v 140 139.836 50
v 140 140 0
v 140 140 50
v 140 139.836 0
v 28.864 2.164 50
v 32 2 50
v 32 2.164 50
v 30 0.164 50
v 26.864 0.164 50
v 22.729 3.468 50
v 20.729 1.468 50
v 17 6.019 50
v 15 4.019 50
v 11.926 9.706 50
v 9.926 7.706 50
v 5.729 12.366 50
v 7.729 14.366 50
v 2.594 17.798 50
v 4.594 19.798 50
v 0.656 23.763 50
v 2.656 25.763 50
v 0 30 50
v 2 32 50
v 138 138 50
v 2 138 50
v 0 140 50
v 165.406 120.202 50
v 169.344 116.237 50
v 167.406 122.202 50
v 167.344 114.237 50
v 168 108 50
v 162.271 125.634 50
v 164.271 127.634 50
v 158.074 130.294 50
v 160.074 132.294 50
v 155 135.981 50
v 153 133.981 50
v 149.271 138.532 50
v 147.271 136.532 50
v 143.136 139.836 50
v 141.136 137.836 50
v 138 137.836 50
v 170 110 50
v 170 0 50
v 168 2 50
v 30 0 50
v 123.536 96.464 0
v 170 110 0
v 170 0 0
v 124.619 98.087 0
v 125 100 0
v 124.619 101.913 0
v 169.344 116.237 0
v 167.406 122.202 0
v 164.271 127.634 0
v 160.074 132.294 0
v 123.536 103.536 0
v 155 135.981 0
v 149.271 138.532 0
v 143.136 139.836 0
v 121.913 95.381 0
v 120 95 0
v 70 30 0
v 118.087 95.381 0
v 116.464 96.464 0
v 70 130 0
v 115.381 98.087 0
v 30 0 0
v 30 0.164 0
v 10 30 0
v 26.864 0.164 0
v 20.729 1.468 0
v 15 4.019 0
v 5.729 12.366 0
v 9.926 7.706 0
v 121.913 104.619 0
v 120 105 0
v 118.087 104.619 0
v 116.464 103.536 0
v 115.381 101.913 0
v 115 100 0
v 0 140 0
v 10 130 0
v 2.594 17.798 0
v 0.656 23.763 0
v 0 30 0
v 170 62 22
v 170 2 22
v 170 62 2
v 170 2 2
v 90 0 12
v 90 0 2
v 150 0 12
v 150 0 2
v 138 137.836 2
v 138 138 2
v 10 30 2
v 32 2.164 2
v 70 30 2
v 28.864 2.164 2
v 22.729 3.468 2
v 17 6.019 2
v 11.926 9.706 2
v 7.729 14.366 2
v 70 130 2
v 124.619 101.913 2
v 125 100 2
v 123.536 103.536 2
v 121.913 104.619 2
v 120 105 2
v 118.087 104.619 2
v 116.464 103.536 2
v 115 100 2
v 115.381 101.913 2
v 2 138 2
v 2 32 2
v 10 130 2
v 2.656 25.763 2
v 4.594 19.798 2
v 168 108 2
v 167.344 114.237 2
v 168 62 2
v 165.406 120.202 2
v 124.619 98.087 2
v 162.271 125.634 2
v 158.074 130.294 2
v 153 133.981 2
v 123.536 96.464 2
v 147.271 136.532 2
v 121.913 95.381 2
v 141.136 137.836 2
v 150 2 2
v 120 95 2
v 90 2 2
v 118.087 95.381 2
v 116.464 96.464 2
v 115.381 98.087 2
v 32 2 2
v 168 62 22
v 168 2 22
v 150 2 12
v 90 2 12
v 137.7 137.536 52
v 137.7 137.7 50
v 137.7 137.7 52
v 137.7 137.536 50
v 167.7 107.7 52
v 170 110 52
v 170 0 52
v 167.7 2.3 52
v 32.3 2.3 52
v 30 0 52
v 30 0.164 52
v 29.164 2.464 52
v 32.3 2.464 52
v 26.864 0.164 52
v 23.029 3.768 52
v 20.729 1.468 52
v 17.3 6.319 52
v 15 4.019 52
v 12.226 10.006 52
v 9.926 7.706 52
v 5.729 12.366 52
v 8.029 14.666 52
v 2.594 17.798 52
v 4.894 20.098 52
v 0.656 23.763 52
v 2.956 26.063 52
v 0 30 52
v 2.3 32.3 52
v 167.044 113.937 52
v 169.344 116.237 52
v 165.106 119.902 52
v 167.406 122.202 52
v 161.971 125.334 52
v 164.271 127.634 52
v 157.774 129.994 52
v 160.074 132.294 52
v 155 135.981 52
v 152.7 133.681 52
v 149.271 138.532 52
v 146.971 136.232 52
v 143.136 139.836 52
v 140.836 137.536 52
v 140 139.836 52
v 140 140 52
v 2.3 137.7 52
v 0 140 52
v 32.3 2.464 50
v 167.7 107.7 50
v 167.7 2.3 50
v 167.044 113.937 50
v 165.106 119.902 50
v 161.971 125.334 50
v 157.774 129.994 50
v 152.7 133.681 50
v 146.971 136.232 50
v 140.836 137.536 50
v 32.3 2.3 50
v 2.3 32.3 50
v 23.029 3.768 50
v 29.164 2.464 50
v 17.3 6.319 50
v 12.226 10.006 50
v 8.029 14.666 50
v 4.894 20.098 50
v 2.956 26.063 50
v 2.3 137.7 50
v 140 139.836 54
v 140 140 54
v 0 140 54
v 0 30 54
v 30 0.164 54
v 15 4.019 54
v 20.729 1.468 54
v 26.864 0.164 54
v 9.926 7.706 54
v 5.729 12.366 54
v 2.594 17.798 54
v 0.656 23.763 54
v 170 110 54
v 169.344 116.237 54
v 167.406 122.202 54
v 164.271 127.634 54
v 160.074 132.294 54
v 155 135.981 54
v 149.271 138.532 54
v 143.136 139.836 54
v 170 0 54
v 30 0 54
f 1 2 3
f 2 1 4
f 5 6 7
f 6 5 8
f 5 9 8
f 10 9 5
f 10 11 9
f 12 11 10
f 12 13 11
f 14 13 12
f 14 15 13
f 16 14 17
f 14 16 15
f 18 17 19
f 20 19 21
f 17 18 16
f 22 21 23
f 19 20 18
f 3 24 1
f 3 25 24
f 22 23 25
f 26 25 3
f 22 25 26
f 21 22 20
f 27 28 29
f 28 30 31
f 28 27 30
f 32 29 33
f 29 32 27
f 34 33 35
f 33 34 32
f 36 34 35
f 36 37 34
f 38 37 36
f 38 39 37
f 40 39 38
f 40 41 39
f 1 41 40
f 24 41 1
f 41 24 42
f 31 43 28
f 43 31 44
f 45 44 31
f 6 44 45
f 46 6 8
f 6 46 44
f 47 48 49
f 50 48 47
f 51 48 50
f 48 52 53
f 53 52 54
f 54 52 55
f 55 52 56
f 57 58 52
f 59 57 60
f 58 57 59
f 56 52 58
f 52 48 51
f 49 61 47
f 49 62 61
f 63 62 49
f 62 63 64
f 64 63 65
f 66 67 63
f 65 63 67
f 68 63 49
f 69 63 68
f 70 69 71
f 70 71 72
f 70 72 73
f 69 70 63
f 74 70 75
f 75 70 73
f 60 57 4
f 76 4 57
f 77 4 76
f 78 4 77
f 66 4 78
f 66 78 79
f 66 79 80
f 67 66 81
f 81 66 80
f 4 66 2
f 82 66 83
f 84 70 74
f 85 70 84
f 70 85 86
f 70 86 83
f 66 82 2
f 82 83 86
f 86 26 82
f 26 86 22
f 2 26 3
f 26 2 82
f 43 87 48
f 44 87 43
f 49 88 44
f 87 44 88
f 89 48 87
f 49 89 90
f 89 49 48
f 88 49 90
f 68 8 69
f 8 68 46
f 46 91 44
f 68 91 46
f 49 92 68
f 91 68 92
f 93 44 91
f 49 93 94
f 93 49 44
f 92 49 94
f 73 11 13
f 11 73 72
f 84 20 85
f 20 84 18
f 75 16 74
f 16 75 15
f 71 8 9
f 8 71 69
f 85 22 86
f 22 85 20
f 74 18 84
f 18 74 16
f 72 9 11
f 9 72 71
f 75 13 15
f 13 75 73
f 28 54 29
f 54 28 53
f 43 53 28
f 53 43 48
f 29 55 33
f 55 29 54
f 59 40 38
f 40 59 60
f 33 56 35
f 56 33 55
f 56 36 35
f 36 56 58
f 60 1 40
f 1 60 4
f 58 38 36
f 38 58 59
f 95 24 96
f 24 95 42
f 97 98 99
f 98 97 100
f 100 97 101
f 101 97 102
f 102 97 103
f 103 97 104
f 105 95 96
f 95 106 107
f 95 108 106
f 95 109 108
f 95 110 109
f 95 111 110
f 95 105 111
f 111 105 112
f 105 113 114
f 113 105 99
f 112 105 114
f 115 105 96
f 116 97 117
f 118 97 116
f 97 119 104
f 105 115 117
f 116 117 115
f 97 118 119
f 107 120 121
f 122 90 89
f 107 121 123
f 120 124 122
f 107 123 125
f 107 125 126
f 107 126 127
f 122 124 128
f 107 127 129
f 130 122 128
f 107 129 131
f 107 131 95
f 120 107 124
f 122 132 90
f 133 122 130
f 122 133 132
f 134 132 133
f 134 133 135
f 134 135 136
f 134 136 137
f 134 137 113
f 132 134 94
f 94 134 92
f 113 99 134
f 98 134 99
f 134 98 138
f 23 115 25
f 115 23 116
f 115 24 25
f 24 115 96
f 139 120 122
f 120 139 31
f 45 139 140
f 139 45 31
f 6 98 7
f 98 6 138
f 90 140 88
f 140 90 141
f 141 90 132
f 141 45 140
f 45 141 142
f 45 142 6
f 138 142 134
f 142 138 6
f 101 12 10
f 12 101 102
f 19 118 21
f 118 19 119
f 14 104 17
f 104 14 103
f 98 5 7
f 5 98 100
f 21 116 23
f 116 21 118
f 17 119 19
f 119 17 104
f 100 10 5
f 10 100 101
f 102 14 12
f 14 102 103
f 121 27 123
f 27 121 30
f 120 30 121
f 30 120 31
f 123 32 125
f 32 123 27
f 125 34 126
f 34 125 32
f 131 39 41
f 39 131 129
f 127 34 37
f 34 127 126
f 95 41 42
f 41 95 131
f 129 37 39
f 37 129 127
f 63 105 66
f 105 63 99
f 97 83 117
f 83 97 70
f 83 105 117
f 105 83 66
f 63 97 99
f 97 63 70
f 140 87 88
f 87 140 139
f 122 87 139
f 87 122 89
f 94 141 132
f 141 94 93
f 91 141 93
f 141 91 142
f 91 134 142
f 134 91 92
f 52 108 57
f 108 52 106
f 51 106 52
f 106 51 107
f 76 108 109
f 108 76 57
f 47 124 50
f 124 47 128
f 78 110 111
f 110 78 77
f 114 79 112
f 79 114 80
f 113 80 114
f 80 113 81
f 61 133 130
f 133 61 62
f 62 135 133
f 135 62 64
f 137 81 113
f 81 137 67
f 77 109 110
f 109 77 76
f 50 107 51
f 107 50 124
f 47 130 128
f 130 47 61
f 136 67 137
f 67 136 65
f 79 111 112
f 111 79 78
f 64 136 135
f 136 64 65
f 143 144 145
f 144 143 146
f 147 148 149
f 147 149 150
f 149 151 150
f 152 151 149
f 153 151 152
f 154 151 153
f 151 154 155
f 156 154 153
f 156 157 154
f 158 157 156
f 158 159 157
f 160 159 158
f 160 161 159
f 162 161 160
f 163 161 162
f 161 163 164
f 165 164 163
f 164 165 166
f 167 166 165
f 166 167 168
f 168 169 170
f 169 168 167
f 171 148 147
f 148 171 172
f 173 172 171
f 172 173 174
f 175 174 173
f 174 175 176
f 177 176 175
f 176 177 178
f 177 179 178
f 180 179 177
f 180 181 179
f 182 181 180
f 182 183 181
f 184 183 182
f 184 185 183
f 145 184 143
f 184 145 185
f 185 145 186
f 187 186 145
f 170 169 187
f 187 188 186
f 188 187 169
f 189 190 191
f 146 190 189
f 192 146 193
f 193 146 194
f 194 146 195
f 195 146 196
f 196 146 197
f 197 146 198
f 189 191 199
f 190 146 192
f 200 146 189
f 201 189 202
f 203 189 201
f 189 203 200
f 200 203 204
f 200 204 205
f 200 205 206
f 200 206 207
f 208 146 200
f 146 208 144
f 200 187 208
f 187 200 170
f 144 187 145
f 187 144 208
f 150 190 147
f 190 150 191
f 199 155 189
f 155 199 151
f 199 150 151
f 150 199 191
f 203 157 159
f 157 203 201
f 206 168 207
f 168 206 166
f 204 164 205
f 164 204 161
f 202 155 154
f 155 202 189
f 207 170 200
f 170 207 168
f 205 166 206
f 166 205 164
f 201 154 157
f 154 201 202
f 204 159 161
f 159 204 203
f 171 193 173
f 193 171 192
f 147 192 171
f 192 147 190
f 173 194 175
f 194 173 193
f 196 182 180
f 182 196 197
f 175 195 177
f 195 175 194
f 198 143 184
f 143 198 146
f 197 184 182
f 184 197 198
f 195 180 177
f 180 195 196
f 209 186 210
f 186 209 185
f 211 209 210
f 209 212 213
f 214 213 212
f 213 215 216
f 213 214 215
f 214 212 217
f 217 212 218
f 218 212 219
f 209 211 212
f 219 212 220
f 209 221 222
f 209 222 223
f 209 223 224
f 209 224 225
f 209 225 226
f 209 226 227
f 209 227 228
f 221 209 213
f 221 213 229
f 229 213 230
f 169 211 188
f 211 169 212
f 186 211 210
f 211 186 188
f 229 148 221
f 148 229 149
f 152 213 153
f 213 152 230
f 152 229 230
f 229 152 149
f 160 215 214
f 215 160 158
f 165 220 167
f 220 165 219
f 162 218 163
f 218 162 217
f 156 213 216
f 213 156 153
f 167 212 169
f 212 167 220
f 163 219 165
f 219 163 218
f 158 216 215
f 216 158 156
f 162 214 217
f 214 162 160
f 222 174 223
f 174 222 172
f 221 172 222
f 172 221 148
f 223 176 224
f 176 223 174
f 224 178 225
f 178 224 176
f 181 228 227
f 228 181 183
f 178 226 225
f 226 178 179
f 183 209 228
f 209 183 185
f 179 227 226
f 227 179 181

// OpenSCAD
s = 2;

w = 170;
l = 140;
h = 50;


printer_w = 60;
printer_l = 100;
printer_x = 10;
printer_y = l-printer_l-10;

ch = 5;

c = 30;

eps = 0.3;

module box(l,w,h) {
translate([0,c,0]) cube([w-c,l-c,h]);
translate([c,0,0]) cube([w-c,l-c,h]);
translate([c,c,0]) cylinder(h,c,c);
translate([w-c,l-c,0]) cylinder(h,c,c);
}


difference(){
box(l,w,h);
translate([s,s,s])box(l-2*s,w-2*s,h-s);

translate([printer_x,printer_y,0]) cube([printer_w,printer_l,s]);

translate([w-s,s,s]) cube([s,60,20]);
translate([w-80,0,s]) cube([60,s,10]);


translate([(w-printer_w-printer_x)/2+printer_w+printer_x,l-40,0]) cylinder(s,ch,ch);

}


translate([0,0,h+s]) {
translate([s+eps,s+eps,-s])box(l-2*s-2*eps,w-2*s-2*eps,s);
box(l,w,s);

    
    }
